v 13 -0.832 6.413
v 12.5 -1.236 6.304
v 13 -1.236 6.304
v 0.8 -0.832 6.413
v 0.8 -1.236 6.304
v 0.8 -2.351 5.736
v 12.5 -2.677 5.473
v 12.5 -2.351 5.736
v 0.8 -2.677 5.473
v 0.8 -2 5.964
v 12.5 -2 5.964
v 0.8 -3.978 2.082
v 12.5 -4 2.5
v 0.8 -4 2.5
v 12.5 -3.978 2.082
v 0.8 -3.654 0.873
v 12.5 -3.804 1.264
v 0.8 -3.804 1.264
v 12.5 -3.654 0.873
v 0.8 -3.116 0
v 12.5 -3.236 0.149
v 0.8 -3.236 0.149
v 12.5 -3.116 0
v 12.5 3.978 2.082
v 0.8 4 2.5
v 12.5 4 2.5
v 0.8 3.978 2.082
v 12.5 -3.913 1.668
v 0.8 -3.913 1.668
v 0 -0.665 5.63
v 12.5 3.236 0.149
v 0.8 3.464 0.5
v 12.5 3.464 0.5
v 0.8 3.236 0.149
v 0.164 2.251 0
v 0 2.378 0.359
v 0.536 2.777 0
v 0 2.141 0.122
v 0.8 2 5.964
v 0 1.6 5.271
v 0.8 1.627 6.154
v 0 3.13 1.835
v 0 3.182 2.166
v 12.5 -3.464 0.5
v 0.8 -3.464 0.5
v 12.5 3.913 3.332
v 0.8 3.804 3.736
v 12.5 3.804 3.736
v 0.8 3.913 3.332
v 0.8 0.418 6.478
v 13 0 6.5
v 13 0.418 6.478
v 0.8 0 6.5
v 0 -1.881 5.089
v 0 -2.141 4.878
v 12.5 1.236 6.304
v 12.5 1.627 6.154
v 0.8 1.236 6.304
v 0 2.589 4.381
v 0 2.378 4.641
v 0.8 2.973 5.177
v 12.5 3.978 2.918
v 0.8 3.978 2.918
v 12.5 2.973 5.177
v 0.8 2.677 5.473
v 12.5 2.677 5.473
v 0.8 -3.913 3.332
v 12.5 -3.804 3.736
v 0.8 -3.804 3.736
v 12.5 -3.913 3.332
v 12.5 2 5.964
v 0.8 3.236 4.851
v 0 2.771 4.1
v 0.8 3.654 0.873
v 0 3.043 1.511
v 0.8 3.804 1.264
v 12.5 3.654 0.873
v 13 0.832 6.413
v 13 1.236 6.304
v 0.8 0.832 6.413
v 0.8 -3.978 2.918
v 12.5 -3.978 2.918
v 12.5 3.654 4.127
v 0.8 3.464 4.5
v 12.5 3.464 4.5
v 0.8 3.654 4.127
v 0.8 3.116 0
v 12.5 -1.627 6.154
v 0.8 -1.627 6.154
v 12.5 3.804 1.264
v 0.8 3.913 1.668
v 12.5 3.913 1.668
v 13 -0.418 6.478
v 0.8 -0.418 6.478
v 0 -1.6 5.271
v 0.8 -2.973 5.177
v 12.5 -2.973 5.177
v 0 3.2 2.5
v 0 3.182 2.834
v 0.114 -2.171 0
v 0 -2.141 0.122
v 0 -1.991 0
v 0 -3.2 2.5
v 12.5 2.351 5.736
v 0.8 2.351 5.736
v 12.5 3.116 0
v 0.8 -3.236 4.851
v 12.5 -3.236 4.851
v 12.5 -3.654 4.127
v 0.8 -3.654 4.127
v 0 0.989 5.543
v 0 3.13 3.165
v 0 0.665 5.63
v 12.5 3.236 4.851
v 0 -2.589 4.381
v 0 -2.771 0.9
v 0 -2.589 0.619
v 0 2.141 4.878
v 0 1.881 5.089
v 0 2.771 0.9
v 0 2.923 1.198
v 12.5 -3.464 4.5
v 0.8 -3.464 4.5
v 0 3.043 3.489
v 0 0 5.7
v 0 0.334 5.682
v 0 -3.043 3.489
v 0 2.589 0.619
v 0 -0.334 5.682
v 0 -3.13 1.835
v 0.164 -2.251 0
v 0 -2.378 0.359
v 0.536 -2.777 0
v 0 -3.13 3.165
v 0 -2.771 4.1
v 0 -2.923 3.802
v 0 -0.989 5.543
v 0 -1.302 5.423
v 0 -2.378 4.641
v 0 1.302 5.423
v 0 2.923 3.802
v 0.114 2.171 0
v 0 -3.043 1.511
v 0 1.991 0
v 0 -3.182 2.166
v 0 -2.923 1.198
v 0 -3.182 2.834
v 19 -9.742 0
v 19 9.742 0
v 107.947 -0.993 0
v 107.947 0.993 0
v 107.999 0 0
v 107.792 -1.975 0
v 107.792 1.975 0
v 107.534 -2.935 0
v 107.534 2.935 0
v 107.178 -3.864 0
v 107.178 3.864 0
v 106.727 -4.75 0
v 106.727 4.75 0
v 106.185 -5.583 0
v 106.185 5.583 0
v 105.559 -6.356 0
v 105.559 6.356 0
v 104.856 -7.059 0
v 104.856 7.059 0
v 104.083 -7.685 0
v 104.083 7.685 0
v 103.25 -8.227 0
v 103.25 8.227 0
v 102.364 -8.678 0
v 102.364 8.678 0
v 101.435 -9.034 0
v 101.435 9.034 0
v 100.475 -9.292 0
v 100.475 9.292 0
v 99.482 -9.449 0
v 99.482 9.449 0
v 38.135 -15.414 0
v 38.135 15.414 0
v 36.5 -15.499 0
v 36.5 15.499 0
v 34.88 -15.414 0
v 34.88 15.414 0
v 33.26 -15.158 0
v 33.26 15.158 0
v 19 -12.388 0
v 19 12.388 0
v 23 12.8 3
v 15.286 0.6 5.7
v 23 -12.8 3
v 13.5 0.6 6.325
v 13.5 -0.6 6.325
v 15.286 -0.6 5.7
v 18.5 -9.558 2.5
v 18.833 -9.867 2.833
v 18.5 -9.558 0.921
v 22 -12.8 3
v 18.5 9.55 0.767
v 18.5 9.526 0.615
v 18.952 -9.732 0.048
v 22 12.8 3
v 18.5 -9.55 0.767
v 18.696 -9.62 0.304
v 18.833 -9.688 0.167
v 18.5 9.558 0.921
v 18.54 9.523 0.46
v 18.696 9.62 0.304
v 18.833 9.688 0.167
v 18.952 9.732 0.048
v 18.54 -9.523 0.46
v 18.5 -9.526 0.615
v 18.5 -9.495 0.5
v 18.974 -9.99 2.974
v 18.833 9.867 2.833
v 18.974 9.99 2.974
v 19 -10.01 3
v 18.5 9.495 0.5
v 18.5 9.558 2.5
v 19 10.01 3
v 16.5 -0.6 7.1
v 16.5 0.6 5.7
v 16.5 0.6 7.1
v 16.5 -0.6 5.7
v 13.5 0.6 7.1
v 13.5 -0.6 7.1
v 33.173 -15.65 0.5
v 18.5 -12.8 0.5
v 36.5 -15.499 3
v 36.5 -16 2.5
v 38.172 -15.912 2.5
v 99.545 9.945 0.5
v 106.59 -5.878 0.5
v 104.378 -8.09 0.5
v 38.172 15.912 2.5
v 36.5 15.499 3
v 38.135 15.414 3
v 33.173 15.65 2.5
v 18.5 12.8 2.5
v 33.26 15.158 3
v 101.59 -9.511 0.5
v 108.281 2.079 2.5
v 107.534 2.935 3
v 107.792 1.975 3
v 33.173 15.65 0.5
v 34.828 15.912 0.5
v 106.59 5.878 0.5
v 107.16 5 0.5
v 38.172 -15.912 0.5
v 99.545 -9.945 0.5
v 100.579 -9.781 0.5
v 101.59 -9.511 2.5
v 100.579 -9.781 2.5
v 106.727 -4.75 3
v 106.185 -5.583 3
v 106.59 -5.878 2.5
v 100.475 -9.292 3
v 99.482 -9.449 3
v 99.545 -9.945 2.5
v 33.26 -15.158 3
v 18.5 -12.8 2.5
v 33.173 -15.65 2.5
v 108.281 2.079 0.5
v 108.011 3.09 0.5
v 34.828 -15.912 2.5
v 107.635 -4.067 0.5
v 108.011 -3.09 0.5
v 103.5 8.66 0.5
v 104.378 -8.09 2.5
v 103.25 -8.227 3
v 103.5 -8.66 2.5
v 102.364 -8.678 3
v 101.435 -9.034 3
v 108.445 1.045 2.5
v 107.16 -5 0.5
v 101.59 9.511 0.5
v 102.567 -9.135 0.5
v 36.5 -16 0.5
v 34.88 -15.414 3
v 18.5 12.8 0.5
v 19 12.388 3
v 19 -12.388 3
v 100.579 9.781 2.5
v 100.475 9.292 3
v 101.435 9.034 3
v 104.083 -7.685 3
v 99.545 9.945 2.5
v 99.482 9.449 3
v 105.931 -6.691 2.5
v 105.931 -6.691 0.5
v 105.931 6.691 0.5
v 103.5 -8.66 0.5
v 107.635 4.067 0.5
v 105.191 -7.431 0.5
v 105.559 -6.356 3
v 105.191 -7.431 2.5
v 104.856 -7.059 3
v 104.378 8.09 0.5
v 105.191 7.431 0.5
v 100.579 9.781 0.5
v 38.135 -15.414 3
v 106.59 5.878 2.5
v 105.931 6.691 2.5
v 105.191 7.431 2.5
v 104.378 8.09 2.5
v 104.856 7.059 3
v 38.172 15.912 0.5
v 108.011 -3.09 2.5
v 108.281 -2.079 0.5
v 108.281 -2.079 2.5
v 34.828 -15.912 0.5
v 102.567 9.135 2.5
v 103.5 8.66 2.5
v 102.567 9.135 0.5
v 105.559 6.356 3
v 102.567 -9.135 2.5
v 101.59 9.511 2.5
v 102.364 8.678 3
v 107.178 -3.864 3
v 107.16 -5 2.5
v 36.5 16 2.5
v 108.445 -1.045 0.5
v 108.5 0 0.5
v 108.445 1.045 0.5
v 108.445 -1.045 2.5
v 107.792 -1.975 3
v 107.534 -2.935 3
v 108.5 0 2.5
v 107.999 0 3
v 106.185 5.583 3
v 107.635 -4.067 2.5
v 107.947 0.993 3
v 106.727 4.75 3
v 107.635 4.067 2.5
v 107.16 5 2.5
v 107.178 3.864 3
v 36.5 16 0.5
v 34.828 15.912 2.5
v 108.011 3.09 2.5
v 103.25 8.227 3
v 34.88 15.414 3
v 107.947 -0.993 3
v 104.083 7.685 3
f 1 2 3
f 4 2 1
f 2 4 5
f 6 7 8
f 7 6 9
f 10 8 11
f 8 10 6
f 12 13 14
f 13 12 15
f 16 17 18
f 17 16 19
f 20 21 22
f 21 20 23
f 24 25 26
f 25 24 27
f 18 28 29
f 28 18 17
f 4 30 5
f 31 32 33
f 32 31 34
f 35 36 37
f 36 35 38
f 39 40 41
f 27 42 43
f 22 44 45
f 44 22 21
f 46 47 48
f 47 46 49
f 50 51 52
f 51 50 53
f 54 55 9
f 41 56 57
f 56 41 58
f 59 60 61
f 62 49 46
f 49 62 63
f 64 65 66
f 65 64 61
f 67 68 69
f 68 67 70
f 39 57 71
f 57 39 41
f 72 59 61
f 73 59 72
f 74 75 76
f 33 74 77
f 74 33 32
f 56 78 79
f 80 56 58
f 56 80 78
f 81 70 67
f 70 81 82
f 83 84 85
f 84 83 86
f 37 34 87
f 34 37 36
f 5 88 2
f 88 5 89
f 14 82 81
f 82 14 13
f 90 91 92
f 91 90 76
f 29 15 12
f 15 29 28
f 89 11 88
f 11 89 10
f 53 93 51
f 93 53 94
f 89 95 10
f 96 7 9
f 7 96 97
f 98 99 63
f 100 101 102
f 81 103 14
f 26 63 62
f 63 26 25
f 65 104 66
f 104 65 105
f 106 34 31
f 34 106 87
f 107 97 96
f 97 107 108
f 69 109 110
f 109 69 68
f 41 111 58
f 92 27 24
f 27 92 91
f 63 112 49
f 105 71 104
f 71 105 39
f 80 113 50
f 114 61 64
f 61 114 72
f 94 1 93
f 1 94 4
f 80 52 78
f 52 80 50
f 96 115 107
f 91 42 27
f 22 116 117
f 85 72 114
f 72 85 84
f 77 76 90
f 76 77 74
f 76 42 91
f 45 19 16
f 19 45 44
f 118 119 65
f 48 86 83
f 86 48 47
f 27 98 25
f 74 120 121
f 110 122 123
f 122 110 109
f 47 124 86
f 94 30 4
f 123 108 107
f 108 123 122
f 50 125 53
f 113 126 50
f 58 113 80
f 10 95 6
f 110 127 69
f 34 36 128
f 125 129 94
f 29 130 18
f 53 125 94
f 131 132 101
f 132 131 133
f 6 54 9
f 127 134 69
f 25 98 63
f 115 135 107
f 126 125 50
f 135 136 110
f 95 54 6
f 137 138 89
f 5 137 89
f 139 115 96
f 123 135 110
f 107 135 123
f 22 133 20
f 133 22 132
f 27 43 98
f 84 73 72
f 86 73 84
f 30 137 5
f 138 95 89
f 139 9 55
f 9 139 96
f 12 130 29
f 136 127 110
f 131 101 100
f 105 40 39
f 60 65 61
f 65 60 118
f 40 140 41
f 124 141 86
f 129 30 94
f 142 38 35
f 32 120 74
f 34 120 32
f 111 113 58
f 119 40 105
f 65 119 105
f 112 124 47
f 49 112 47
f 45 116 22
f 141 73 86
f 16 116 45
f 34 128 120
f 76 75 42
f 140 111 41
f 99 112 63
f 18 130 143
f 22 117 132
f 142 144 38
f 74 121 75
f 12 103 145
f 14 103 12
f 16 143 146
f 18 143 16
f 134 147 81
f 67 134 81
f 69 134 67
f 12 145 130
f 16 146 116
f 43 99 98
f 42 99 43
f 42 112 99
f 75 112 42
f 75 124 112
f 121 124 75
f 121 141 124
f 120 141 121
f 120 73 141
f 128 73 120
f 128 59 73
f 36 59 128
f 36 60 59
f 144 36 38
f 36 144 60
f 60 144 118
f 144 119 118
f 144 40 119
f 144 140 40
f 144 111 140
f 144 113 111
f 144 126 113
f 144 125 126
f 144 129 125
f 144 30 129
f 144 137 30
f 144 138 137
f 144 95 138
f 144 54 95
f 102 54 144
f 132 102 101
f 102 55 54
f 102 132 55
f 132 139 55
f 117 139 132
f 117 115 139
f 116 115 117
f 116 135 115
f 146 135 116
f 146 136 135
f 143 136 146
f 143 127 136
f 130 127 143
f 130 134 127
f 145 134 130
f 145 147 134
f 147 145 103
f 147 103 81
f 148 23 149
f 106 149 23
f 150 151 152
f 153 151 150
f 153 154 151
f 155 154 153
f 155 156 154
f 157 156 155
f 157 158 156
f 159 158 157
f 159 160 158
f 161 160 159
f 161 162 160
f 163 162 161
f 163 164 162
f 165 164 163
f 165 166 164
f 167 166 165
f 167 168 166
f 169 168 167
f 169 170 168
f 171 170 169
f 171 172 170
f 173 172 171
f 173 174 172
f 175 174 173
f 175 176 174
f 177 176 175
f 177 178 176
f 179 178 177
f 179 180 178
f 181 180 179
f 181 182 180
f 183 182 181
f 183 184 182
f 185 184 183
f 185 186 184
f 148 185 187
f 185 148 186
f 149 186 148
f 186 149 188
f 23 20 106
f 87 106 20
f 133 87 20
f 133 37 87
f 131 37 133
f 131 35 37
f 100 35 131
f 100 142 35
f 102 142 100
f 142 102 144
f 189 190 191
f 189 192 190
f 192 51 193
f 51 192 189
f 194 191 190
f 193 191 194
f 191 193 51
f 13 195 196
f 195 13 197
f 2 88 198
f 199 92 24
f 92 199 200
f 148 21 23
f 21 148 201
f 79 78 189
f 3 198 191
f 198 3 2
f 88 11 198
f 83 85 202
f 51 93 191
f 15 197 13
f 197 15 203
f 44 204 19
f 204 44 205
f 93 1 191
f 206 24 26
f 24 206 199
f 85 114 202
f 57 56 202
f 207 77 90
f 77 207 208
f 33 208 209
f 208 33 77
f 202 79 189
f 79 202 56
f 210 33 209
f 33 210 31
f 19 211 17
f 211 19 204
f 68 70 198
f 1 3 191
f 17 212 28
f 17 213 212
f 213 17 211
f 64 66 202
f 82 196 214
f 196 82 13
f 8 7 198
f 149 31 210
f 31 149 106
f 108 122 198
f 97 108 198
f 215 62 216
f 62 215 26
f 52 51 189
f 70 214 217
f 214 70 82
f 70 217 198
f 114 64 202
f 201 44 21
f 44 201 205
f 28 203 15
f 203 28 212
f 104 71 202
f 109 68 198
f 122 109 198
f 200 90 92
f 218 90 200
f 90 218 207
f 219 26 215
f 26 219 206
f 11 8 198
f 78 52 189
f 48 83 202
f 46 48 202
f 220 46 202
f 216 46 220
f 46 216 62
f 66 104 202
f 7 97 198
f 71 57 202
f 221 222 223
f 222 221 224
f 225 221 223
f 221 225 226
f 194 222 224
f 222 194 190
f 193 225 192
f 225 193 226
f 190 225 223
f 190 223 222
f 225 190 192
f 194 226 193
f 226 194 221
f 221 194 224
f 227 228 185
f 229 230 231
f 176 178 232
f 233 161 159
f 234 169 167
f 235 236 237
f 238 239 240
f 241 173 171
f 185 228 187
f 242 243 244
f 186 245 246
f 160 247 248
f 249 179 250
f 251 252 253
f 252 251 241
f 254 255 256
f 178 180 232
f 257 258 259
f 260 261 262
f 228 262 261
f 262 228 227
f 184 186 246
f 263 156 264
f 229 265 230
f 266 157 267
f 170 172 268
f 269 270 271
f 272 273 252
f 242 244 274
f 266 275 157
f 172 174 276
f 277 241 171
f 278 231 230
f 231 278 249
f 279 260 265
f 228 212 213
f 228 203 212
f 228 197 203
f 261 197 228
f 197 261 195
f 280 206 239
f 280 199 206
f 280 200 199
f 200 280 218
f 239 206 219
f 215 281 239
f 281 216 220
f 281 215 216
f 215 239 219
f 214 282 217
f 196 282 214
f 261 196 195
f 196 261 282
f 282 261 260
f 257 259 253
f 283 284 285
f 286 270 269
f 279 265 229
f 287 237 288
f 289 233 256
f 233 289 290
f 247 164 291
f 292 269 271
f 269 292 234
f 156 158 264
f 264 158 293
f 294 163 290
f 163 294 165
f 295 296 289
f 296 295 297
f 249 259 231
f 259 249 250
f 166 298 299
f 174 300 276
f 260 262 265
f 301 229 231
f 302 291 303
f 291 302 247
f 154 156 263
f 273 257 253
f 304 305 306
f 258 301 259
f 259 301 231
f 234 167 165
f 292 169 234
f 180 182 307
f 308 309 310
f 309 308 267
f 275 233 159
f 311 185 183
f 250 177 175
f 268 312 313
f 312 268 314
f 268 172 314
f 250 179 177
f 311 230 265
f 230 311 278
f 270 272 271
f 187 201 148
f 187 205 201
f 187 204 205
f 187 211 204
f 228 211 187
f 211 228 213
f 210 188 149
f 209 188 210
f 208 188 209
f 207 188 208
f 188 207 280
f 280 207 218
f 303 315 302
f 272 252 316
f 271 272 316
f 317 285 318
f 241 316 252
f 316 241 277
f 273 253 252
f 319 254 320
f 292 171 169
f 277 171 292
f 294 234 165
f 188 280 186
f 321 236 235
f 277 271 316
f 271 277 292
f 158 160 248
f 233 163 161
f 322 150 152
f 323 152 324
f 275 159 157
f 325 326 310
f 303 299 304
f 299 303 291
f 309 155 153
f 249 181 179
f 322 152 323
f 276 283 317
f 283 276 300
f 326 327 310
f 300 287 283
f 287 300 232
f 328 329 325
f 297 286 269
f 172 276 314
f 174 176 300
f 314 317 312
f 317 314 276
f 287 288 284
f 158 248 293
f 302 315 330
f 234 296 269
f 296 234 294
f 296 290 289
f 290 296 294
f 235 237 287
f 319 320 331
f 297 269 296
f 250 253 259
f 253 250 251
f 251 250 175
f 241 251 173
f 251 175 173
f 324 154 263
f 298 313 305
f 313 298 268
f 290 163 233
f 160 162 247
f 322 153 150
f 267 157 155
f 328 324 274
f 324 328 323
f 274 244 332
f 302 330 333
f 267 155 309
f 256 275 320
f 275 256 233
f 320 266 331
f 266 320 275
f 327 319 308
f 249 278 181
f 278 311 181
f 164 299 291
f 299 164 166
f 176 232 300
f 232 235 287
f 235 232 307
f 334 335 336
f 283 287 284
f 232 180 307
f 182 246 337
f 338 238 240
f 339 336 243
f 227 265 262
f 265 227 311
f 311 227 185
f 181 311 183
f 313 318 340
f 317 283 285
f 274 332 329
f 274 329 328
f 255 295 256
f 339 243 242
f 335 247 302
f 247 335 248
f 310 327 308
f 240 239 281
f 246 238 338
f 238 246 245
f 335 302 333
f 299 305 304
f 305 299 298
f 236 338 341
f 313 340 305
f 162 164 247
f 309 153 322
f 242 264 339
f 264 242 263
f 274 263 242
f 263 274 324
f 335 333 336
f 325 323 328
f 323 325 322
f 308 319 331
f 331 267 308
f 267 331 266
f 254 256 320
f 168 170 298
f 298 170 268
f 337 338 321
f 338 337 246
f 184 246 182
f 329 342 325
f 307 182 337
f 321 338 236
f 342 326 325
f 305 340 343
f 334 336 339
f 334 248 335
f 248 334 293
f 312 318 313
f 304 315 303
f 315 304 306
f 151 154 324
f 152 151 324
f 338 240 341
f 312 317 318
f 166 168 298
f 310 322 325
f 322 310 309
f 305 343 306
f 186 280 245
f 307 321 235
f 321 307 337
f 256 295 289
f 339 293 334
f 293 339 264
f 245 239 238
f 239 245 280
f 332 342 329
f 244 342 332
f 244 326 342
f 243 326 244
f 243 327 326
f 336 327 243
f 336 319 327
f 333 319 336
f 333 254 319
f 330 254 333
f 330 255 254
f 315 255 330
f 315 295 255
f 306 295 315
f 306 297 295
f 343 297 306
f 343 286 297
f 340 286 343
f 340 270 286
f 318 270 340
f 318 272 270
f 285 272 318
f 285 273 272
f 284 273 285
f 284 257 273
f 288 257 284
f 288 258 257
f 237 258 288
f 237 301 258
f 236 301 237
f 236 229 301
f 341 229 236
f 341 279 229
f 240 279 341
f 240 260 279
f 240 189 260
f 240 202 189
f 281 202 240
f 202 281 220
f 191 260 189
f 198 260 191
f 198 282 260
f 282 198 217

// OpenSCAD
// file: ../../COMMON/stem_core.scad
// =====================================================================
//  stem_core.scad — shared geometry helpers for every STEM_KIT part.
// =====================================================================
include <../PARAMETERS/config.scad>
// =====================================================================

// ---------- rounded / chamfered prisms --------------------------------

// Rounded rectangle (2D), centred.
module rrect(size, r) {
    rr = min(r, min(size[0], size[1]) / 2 - 0.01);
    offset(r = rr) square([size[0] - 2 * rr, size[1] - 2 * rr], center = true);
}

// Box with rounded vertical edges, chamfered bottom edge (elephant-foot
// relief) and rounded-ish (chamfered) top edge. Sits on z = 0, centred XY.
module rbox(size, r = 2, top = edge_r, bottom = chamfer) {
    h = size[2];
    hull() {
        linear_extrude(0.01) rrect([size[0] - 2 * bottom, size[1] - 2 * bottom], max(r - bottom, 0.1));
        translate([0, 0, bottom]) linear_extrude(h - bottom - top) rrect([size[0], size[1]], r);
        translate([0, 0, h - 0.01]) linear_extrude(0.01) rrect([size[0] - 2 * top, size[1] - 2 * top], max(r - top, 0.1));
    }
}

// Cylinder with chamfered/rounded top and bottom edges (safe hubs, knobs).
module rcyl(d, h, top = edge_r, bottom = chamfer) {
    rotate_extrude() polygon([
        [0, 0], [d / 2 - bottom, 0], [d / 2, bottom],
        [d / 2, h - top], [d / 2 - top, h], [0, h]
    ]);
}

// Stadium (slot / rounded bar) 2D between two points on the X axis.
module stadium2d(len, w) {
    hull() { circle(d = w); translate([len, 0]) circle(d = w); }
}

// ---------- holes ------------------------------------------------------

// Vertical through hole with small top/bottom chamfers.
module vhole(d = grid_hole_d, h = 50, ch = 0.4) {
    translate([0, 0, -h / 2]) cylinder(d = d, h = h);
}

// Horizontal hole along +Y, printable without supports (teardrop tip up).
module teardrop_y(d, len, center = true) {
    translate([0, center ? -len / 2 : 0, 0]) rotate([-90, 0, 0])
        linear_extrude(len) teardrop2d(d);
}
module teardrop_x(d, len, center = true) {
    translate([center ? -len / 2 : 0, 0, 0]) rotate([0, 90, 0]) rotate([0, 0, -90])
        linear_extrude(len) teardrop2d(d);
}
// 2D teardrop: circle + 45° roof pointing "up" in the final part (+Z).
// After rotate([-90,0,0]) local +Y becomes -Z, so the roof points to -Y here.
module teardrop2d(d) {
    r = d / 2;
    union() {
        circle(d = d);
        polygon([[-r * sqrt(2) / 2, -r * sqrt(2) / 2], [0, -r * sqrt(2)], [r * sqrt(2) / 2, -r * sqrt(2) / 2]]);
    }
}

// Hex nut pocket (flat sides parallel to X), opening at z = 0 going +Z.
module nut_pocket(depth = nut_pocket_depth, af = nut_pocket_af) {
    cylinder(d = af / cos(30), h = depth, $fn = 6);
}

// Side-entry nut slot: nut plane is XY, slot opens toward +dir (X).
// Centred on the screw axis (Z), slot height nut_slot_t, runs out `len`.
module nut_slot_x(len = 10, af = nut_pocket_af, t = nut_slot_t) {
    translate([0, 0, -t / 2]) hull() {
        cylinder(d = af / cos(30), h = t, $fn = 6);
        translate([len, 0, 0]) cylinder(d = af / cos(30), h = t, $fn = 6);
    }
}

// Counterbored clearance hole from top surface at height `top` downward.
module cbore(top, depth, d = counterbore_d) {
    translate([0, 0, top - depth]) cylinder(d = d, h = depth + 20);
    translate([0, 0, -20]) cylinder(d = grid_hole_d, h = top + 40);
}

// Grid of vertical holes: nx x ny, pitch grid_pitch, first hole centred
// at `origin` (XY). Used by every plate.
module grid_holes(nx, ny, origin = [0, 0], h = 100, d = grid_hole_d) {
    for (i = [0 : nx - 1], j = [0 : ny - 1])
        translate([origin[0] + i * grid_pitch, origin[1] + j * grid_pitch, 0]) vhole(d, h);
}

// Slot (for adjustable mounting) along X, length = travel.
module slot_x(travel, d = grid_hole_d, h = 100) {
    translate([-travel / 2, 0, -h / 2]) linear_extrude(h) stadium2d(travel, d);
}

// ---------- shaft bores ------------------------------------------------

// 2D bore profile: round, or D if shaft_flat > 0.
module bore2d(d) {
    if (shaft_flat > 0)
        intersection() { circle(d = d); translate([-d, -d / 2]) square([2 * d, d - shaft_flat + (d - shaft_diameter) / 2]); }
    else circle(d = d);
}

// Standard HUB: cylinder hub_d x hub_h standing on z = z0, with bore,
// radial M3 set screw at mid height and a captive-nut slot from the top.
// Call inside difference() for the cut-outs: hub_body()/hub_cuts().
module hub_body(z0, d = hub_d, h = hub_h) {
    translate([0, 0, z0]) rcyl(d, h, top = 0.8, bottom = 0);
}
module hub_cuts(z0, total_h, d = hub_d, h = hub_h, bore = shaft_fixed_bore, set_screw = true, screw_angle = 0) {
    // bore through everything
    translate([0, 0, -1]) linear_extrude(total_h + 2) bore2d(bore);
    // entry chamfer on bore
    translate([0, 0, total_h - 0.6]) cylinder(d1 = bore, d2 = bore + 1.2, h = 0.61);
    translate([0, 0, -0.01]) cylinder(d1 = bore + 1.2, d2 = bore, h = 0.6);
    if (set_screw) rotate([0, 0, screw_angle]) {
        zs = z0 + h / 2;
        // radial screw hole (teardrop, prints without support)
        translate([0, 0, zs]) teardrop_x(screw_clear_d, d, center = false);
        // captive nut slot, entered from the hub top face
        nr = bore / 2 + (d / 2 - bore / 2) / 2;       // radial position of nut
        translate([nr - nut_slot_t / 2, -nut_pocket_af / 2, zs - nut_pocket_af / cos(30) / 2 - 0.1])
            cube([nut_slot_t, nut_pocket_af, total_h + 10]);   // open to the hub top face
    }
}

// ---------- labels -----------------------------------------------------

// Engrave text into a top surface at height z (depth 0.6 = 3 layers).
module engrave(txt, size = 5, z = 0, depth = 0.6, halign = "center") {
    translate([0, 0, z - depth]) linear_extrude(depth + 1)
        text(txt, size = size, font = "Liberation Sans:style=Bold", halign = halign, valign = "center");
}

// ---------- misc -------------------------------------------------------

function grid_snap(v) = ceil(v / grid_pitch) * grid_pitch;
// file: ../../PARAMETERS/config.scad
// =====================================================================
//  STEM_KIT — CENTRAL PARAMETER FILE  ("ForgeGrid" mechanical standard)
// ---------------------------------------------------------------------
//  Every part in the library includes this file. Change a value here,
//  run `python3 tools/build.py`, and the whole library regenerates.
//  All dimensions in millimetres.
// =====================================================================

// ---------------------------------------------------------------------
// 1. PRINTER / PROCESS
// ---------------------------------------------------------------------
nozzle          = 0.4;
layer_height    = 0.2;
tolerance       = 0.2;    // sliding clearance per side (tune with STEM_TOLERANCE_TEST)
press_allow     = 0.05;   // extra for press fits (bores that should grip)
min_wall        = 1.6;    // never go below this
wall_thickness  = 2.4;    // preferred wall (6 perimeters @ 0.4)
edge_r          = 1.0;    // rounding of exposed edges (child safety)
chamfer         = 0.6;    // bottom-edge chamfer (elephant-foot relief)

$fa = 6;                  // facet angle
$fs = 0.4;                // facet size

// ---------------------------------------------------------------------
// 2. GRID  (the heart of the ecosystem)
// ---------------------------------------------------------------------
//  Holes sit on a 10 mm lattice, 5 mm in from every plate edge, so
//  plates placed side by side keep one continuous lattice.
grid_pitch            = 10;
plate_size            = 100;   // universal base plate (square)
plate_thickness       = 6;     // base plates, rails, chassis
foot_thickness        = 4;     // flange / foot of every mount
//  => standard joint: 4 mm foot + 6 mm plate = M3 x 10 screw, nut in
//     the hex pocket under the plate. One screw length does 90 % of joints.

// ---------------------------------------------------------------------
// 3. FASTENERS (M3 everywhere: one screwdriver, one nut)
// ---------------------------------------------------------------------
screw_size            = 3;
screw_clear_d         = 3.4;   // clearance hole (also the grid hole)
grid_hole_d           = screw_clear_d;
screw_tap_d           = 2.6;   // hole a screw self-taps into
screw_head_d          = 5.7;   // ISO 7380 BUTTON head = kit standard (low, rounded, child-safe)
screw_head_h          = 1.65;
counterbore_d         = 6.4;
nut_af                = 5.5;   // M3 nut across flats
nut_thick             = 2.4;
nut_pocket_af         = nut_af + 0.35;
nut_pocket_depth      = 3.0;   // pocket under plates (nut sits flush)
nut_slot_t            = nut_thick + 0.4;  // side-entry slot thickness
set_screw_len         = 6;     // M3 x 6 grub screw for hubs

// ---------------------------------------------------------------------
// 4. SHAFTS
// ---------------------------------------------------------------------
//  Default: 3 mm steel rod (silver steel / stainless). Printed shafts
//  are provided for light-duty use. Alternative systems: set
//  shaft_diameter = 4 or 5 and rebuild.
shaft_diameter        = 3;
shaft_flat            = 0;     // >0 : D-shaft, flat depth (e.g. 0.5)
shaft_fixed_bore      = shaft_diameter + 0.15;  // hub bore (set-screw locked)
shaft_free_bore       = shaft_diameter + 0.4;   // free-spinning bore / bushing
shaft_lengths         = [40, 60, 80, 100, 120];

//  Horizontal shafts: all pillow blocks, motor mounts and axle mounts
//  put their axis at this height above the surface they are bolted to,
//  so any two of them on the grid are automatically coaxial/parallel.
axis_height           = 17;
axis_height_high      = 37;    // = axis_height + 2 pitches (pulleys, big wheels)

// ---------------------------------------------------------------------
// 5. BEARINGS
// ---------------------------------------------------------------------
bearing_size          = [5, 16, 5];   // 625 : bore, OD, width (default housing)
bearing_small         = [3, 10, 4];   // 623 : fits 3 mm shafts via adapter ring
bearing_pocket_d      = bearing_size[1] + 0.15;

// ---------------------------------------------------------------------
// 6. GEARS
// ---------------------------------------------------------------------
//  Module 2 + tooth counts that are multiples of 10  =>  centre distance
//  = (z1+z2) mm is ALWAYS a multiple of 10  =>  ANY two gears mesh when
//  their shafts sit in grid holes. (3-4-5 diagonals also work: 50 mm.)
gear_module           = 2;
gear_pressure_angle   = 20;
gear_width            = 6;
gear_backlash         = 0.30;  // total circular backlash per mesh
gear_clearance_k      = 0.25;  // root clearance = k * module
gear_teeth_set        = [10, 20, 30, 40];
//  Gearbox frame: two frame plates, outer faces 60 mm apart (on grid),
//  48 mm gap = three gear levels (A, M, B).
frame_gap             = 48;
hub_d                 = 14;
hub_h                 = 7;

// ---------------------------------------------------------------------
// 7. WHEELS / PULLEYS
// ---------------------------------------------------------------------
wheel_diameter        = 60;
wheel_width           = 10;
axle_diameter         = shaft_diameter;
oring_cs              = 3.0;    // O-ring cross-section used as tyre / belt
belt_cs               = 2.5;    // O-ring / round-belt cord for pulleys
pulley_sizes          = [20, 40, 60];  // effective (belt-line) diameters

// ---------------------------------------------------------------------
// 8. MOTORS (130-size toy / solar motor is the default)
// ---------------------------------------------------------------------
motor_size            = [20.2, 15.2, 25.2]; // body dia, across-flats, length
motor_d               = motor_size[0];
motor_flat            = motor_size[1];
motor_len             = motor_size[2];
motor_boss_d          = 6.2;
motor_boss_h          = 1.6;
motor_shaft_d         = 2.0;
motor_shaft_len       = 8.5;   // beyond boss
motor_shaft_bore      = 1.9;   // press fit onto 2 mm motor shaft

// ---------------------------------------------------------------------
// 9. SOLAR PANEL (bought, not printed) — frame is parametric
// ---------------------------------------------------------------------
solar_panel_size      = [110, 69, 3.0];  // 5 V 1 W epoxy panel (common)
solar_panel_clear     = 0.6;

// ---------------------------------------------------------------------
// 10. ELECTRONICS
// ---------------------------------------------------------------------
mounting_hole_spacing = grid_pitch;   // everything bolts to the grid
electronics_slot_w    = screw_clear_d;
led_hole_d            = 5.1;
buzzer_hole_d         = 12.2;

// ---------------------------------------------------------------------
// 11. SAFETY LIMITS (checked by tools/qc.py)
// ---------------------------------------------------------------------
max_part_voltage      = 12;    // nothing in this kit uses more
min_rim_thickness     = 2.0;   // blades/links: no edge thinner than this
finger_gap_max        = 6;     // guard openings smaller than a child's finger
// main file
// =====================================================================
//  PART: wind turbine blade — WIND/turbine
//  Flat, thick-edged (≥ 2 mm, rounded) blade: safe to touch, prints flat.
//  style = "standard" | "torque" (wide & short: starts in light wind,
//          strong turning force) | "speed" (narrow & long: spins fast).
//  Root peg Ø8 fits every hub socket; the small fin on the root is the
//  pitch pointer — line it up with the hub's tick marks.
//  Print: flat. No supports.
// =====================================================================
include <../../PARAMETERS/config.scad>
use <../../COMMON/stem_core.scad>

style = "standard";
turbine_blade(style);

function blade_dims(s) =            // [length, root width, tip width]
    s == "torque" ? [80, 44, 34] :
    s == "speed"  ? [100, 22, 12] :
                    [90, 32, 20];

module turbine_blade(s = "standard") {
    d = blade_dims(s);
    L = d[0]; wr = d[1]; wt = d[2];
    t = 3;                       // blade thickness
    pr = 4;                      // peg radius
    pz = t / 2 + 1.0;            // peg axis height (peg flat on the bed)
    peg = 12.5;                  // peg length (socket 12)
    x0 = peg + 6;                // blade starts here
    c = 0.5;                     // edge chamfer → 2 mm flat edge
    union() {
        // root peg with a flat underside
        difference() {
            translate([0, 0, pz]) rotate([0, 90, 0])        // chamfered tip = lead-in
                rotate_extrude() polygon([[0, 0], [pr - 0.8, 0], [pr, 0.8], [pr, peg + 0.5], [0, peg + 0.5]]);
            translate([-1, -5, -5]) cube([peg + 3, 10, 5]);
        }
        // neck: peg → blade
        hull() {
            translate([peg, 0, 0]) intersection() {
                translate([0, 0, pz]) rotate([0, 90, 0]) cylinder(r = pr, h = 0.5);
                translate([-1, -5, 0]) cube([3, 10, 10]);
            }
            translate([x0 + 4, 0, 0]) linear_extrude(t) square([1, wr * 0.8], center = true);
        }
        // pitch pointer fin on top of the neck
        translate([peg + 1, -0.6, pz + pr - 0.8]) cube([3, 1.2, 1.4]);
        // blade body with chamfered (rounded) edges
        hull() {
            translate([0, 0, c]) linear_extrude(t - 2 * c) blade2d(x0, L, wr, wt);
            linear_extrude(t) offset(delta = -c) blade2d(x0, L, wr, wt);
        }
    }
}
module blade2d(x0, L, wr, wt) {
    hull() {
        translate([x0, -wr / 2 * 0.8]) square([1, wr * 0.8]);
        translate([x0 + wr / 2 + 2, 0]) circle(d = wr);          // never reaches behind the root
        translate([x0 + L - wt / 2, 0]) circle(d = wt);
    }
}
